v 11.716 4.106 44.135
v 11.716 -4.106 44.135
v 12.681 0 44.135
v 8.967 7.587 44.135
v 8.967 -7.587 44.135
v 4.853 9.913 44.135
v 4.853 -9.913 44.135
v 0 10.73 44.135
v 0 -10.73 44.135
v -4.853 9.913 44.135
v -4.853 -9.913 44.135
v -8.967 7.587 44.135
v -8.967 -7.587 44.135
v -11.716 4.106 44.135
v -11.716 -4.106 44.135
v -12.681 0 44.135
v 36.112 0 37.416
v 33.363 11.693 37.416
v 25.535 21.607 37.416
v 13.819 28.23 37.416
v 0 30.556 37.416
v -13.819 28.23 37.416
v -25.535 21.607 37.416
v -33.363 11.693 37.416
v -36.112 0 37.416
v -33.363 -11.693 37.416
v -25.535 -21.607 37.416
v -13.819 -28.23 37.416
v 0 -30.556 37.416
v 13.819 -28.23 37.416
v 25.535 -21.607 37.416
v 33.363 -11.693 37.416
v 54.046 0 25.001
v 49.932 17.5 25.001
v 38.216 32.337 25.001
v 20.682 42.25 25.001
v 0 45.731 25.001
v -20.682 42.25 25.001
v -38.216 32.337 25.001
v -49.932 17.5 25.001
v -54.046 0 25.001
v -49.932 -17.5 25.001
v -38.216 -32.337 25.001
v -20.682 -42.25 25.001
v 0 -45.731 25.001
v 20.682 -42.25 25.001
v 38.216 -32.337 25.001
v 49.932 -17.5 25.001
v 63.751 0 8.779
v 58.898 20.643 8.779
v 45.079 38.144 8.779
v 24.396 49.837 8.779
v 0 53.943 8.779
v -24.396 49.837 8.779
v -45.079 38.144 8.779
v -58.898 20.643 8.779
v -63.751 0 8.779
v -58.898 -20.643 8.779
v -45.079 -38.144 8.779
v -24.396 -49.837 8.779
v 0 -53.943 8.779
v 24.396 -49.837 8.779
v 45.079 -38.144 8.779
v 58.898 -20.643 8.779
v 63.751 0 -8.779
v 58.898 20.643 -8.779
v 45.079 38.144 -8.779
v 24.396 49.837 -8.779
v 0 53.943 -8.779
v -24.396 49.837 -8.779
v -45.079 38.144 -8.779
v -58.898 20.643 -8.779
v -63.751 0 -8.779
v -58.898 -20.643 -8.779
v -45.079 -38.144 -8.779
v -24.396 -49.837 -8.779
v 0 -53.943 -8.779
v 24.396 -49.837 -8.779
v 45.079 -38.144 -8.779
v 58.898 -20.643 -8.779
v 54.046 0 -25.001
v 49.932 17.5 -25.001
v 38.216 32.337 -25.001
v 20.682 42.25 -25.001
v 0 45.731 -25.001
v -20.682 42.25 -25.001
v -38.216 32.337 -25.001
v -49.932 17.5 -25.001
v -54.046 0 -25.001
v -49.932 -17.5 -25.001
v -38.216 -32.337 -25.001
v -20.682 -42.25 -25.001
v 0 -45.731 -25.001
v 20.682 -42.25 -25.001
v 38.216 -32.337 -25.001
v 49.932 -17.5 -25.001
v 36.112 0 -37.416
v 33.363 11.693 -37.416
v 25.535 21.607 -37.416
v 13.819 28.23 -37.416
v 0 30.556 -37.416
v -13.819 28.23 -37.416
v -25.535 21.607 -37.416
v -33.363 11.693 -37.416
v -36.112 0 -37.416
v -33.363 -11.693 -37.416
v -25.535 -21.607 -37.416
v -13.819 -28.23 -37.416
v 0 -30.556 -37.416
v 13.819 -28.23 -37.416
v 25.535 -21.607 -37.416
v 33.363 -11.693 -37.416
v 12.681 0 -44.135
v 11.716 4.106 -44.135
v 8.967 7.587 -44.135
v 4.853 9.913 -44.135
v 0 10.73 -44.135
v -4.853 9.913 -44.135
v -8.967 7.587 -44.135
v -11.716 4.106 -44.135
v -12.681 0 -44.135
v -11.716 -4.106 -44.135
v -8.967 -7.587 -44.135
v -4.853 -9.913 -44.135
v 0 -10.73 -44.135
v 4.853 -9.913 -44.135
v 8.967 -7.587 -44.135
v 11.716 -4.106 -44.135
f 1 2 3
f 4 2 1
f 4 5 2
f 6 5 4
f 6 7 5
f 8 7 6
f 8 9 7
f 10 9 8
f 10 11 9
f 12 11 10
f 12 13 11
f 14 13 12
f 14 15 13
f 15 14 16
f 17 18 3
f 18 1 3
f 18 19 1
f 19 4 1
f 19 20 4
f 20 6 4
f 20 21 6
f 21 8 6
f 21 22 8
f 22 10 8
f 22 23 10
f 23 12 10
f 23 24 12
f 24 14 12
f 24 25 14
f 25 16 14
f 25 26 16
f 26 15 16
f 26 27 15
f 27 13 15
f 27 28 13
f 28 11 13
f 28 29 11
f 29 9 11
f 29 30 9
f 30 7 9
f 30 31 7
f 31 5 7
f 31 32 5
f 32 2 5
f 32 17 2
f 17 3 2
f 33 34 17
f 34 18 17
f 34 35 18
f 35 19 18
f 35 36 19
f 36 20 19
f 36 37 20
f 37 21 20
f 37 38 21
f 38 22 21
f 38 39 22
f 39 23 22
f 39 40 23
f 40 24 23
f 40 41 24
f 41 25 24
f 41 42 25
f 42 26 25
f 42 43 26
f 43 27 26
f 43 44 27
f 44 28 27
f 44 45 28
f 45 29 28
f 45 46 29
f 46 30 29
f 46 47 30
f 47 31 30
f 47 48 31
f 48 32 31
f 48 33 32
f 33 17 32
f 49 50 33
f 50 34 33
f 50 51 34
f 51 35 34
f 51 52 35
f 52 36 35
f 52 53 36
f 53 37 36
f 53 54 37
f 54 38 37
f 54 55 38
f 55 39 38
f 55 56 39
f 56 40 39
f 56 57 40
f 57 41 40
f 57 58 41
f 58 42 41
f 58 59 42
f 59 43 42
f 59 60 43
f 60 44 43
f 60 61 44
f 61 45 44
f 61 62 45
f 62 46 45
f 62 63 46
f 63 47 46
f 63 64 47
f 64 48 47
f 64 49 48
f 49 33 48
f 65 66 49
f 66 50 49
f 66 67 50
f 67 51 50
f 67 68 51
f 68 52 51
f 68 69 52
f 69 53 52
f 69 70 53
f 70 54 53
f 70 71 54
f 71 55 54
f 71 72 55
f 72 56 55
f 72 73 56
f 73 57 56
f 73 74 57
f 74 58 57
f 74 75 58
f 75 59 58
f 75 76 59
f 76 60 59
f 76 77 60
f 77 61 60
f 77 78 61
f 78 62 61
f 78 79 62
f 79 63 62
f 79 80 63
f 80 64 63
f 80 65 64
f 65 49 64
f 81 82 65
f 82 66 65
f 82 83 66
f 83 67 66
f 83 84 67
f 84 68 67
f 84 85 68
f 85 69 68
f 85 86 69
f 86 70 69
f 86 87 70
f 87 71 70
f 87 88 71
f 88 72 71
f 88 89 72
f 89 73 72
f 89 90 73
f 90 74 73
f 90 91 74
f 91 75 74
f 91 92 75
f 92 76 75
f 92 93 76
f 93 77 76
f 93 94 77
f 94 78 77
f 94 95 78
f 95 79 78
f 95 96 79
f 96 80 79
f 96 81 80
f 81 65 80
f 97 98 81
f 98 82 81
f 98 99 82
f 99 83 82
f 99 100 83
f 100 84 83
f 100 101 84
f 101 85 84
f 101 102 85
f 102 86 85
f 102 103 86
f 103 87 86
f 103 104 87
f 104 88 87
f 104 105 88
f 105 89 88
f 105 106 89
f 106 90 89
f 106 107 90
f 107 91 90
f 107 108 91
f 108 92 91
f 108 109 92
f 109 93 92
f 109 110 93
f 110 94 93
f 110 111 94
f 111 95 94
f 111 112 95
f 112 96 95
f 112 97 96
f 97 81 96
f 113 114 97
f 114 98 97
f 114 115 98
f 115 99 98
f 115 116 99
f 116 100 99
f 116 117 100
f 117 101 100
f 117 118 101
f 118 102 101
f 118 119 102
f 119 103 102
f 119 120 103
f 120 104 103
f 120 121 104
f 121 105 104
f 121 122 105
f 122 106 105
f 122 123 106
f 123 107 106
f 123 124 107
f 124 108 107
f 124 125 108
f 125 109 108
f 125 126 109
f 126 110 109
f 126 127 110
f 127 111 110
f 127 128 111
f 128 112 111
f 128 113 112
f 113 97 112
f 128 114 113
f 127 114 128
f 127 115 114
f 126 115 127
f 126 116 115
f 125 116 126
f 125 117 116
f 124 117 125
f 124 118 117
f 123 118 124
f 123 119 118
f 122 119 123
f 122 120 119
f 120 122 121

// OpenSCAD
// Generated by SolidPython 1.0.1 on 2020-07-29 00:46:50


scale(v = [13, 11, 9]) {
	sphere(r = 5);
}
/***********************************************
*********      SolidPython code:      **********
************************************************
 
# import packages: SolidPython
from solid import *
from solid.utils import *
from itertools import chain, combinations, permutations


class Resize:

    def __init__(self, scad_file):
        self.scad_file = scad_file
        #self.scad_file = import_scad(scad_file)
        # cone/cylinder param:
        self.r1 = 0
        self.r2 = 0
        self.h = 0
        # rectangular prism param:
        self.w = 0
        self.l = 0
        # ellipse param:
        self.r = 0

    # import OpenScad code (file name corresponds to shape)


    # classify shape + parameters
    def assign(self, param1, param2, param3):
        if self.scad_file == 'cone.scad':
            self.r1 = param1
            self.r2 = param2
            self.h = param3
        elif self.scad_file == 'cylinder.scad':
            self.r1 = param1
            self.r2 = param2
            self.h = param3
        elif self.scad_file == 'rectangularPrism.scad':
            self.h = param1
            self.l = param2
            self.w = param3
        else:
            self.r = param1
            self.h = param2

    # resize parameters
    def iterate(self):
        x = range(3, 20, 2)
        i = 1
        if self.scad_file == 'cone.scad':
            tempList = list(permutations(x, 2))
            for temp in tempList:
                param1 = temp[0]
                param2 = temp[1]
                filepath = 'produced_scad_files/' + 'cone' + str(param1) + '_' + str(param2) + '_' + '.scad'
                scad_render_to_file(cylinder(h=param1, r1=param2, r2=0), filepath)

        elif self.scad_file == 'cylinder.scad':
            tempList = list(permutations(x, 3))
            for temp in tempList:
                param1 = temp[0]
                param2 = temp[1]
                filepath = 'produced_scad_files/' + 'cylinder' + str(param1) + '_' + str(param2) + '_' + '.scad'
                scad_render_to_file(cylinder(h=param1, r1=param2, r2=param2), filepath)

        elif self.scad_file == 'rectangularPrism.scad':
            tempList = list(permutations(x, 3))
            for temp in tempList:
                param1 = temp[0]
                param2 = temp[1]
                param3 = temp[2]
                filepath = 'produced_scad_files/' + 'rectangularPrism' + str(param1) + '_' + str(param2) + '_' + str(
                    param3) + '.scad'
                scad_render_to_file(cube(size=(param1, param2, param3)), filepath)

        elif self.scad_file == 'ellipse.scad':
            tempList = list(permutations(x, 4))
            for temp in tempList:
                param1 = temp[0]
                param2 = temp[1]
                param3 = temp[2]
                param4 = temp[3]
                filepath = 'produced_scad_files/' + 'ellipse' + str(param1) + '_' + str(param2) + '_' + str(param3) + '_' + str(param4) + '.scad'
                scad_render_to_file(scale([param1, param2, param3])(sphere(r=param4)), filepath)

    def render_to_scadfile(self):
        scad_render_to_file(scad, 'example.scad') 
 
************************************************/
